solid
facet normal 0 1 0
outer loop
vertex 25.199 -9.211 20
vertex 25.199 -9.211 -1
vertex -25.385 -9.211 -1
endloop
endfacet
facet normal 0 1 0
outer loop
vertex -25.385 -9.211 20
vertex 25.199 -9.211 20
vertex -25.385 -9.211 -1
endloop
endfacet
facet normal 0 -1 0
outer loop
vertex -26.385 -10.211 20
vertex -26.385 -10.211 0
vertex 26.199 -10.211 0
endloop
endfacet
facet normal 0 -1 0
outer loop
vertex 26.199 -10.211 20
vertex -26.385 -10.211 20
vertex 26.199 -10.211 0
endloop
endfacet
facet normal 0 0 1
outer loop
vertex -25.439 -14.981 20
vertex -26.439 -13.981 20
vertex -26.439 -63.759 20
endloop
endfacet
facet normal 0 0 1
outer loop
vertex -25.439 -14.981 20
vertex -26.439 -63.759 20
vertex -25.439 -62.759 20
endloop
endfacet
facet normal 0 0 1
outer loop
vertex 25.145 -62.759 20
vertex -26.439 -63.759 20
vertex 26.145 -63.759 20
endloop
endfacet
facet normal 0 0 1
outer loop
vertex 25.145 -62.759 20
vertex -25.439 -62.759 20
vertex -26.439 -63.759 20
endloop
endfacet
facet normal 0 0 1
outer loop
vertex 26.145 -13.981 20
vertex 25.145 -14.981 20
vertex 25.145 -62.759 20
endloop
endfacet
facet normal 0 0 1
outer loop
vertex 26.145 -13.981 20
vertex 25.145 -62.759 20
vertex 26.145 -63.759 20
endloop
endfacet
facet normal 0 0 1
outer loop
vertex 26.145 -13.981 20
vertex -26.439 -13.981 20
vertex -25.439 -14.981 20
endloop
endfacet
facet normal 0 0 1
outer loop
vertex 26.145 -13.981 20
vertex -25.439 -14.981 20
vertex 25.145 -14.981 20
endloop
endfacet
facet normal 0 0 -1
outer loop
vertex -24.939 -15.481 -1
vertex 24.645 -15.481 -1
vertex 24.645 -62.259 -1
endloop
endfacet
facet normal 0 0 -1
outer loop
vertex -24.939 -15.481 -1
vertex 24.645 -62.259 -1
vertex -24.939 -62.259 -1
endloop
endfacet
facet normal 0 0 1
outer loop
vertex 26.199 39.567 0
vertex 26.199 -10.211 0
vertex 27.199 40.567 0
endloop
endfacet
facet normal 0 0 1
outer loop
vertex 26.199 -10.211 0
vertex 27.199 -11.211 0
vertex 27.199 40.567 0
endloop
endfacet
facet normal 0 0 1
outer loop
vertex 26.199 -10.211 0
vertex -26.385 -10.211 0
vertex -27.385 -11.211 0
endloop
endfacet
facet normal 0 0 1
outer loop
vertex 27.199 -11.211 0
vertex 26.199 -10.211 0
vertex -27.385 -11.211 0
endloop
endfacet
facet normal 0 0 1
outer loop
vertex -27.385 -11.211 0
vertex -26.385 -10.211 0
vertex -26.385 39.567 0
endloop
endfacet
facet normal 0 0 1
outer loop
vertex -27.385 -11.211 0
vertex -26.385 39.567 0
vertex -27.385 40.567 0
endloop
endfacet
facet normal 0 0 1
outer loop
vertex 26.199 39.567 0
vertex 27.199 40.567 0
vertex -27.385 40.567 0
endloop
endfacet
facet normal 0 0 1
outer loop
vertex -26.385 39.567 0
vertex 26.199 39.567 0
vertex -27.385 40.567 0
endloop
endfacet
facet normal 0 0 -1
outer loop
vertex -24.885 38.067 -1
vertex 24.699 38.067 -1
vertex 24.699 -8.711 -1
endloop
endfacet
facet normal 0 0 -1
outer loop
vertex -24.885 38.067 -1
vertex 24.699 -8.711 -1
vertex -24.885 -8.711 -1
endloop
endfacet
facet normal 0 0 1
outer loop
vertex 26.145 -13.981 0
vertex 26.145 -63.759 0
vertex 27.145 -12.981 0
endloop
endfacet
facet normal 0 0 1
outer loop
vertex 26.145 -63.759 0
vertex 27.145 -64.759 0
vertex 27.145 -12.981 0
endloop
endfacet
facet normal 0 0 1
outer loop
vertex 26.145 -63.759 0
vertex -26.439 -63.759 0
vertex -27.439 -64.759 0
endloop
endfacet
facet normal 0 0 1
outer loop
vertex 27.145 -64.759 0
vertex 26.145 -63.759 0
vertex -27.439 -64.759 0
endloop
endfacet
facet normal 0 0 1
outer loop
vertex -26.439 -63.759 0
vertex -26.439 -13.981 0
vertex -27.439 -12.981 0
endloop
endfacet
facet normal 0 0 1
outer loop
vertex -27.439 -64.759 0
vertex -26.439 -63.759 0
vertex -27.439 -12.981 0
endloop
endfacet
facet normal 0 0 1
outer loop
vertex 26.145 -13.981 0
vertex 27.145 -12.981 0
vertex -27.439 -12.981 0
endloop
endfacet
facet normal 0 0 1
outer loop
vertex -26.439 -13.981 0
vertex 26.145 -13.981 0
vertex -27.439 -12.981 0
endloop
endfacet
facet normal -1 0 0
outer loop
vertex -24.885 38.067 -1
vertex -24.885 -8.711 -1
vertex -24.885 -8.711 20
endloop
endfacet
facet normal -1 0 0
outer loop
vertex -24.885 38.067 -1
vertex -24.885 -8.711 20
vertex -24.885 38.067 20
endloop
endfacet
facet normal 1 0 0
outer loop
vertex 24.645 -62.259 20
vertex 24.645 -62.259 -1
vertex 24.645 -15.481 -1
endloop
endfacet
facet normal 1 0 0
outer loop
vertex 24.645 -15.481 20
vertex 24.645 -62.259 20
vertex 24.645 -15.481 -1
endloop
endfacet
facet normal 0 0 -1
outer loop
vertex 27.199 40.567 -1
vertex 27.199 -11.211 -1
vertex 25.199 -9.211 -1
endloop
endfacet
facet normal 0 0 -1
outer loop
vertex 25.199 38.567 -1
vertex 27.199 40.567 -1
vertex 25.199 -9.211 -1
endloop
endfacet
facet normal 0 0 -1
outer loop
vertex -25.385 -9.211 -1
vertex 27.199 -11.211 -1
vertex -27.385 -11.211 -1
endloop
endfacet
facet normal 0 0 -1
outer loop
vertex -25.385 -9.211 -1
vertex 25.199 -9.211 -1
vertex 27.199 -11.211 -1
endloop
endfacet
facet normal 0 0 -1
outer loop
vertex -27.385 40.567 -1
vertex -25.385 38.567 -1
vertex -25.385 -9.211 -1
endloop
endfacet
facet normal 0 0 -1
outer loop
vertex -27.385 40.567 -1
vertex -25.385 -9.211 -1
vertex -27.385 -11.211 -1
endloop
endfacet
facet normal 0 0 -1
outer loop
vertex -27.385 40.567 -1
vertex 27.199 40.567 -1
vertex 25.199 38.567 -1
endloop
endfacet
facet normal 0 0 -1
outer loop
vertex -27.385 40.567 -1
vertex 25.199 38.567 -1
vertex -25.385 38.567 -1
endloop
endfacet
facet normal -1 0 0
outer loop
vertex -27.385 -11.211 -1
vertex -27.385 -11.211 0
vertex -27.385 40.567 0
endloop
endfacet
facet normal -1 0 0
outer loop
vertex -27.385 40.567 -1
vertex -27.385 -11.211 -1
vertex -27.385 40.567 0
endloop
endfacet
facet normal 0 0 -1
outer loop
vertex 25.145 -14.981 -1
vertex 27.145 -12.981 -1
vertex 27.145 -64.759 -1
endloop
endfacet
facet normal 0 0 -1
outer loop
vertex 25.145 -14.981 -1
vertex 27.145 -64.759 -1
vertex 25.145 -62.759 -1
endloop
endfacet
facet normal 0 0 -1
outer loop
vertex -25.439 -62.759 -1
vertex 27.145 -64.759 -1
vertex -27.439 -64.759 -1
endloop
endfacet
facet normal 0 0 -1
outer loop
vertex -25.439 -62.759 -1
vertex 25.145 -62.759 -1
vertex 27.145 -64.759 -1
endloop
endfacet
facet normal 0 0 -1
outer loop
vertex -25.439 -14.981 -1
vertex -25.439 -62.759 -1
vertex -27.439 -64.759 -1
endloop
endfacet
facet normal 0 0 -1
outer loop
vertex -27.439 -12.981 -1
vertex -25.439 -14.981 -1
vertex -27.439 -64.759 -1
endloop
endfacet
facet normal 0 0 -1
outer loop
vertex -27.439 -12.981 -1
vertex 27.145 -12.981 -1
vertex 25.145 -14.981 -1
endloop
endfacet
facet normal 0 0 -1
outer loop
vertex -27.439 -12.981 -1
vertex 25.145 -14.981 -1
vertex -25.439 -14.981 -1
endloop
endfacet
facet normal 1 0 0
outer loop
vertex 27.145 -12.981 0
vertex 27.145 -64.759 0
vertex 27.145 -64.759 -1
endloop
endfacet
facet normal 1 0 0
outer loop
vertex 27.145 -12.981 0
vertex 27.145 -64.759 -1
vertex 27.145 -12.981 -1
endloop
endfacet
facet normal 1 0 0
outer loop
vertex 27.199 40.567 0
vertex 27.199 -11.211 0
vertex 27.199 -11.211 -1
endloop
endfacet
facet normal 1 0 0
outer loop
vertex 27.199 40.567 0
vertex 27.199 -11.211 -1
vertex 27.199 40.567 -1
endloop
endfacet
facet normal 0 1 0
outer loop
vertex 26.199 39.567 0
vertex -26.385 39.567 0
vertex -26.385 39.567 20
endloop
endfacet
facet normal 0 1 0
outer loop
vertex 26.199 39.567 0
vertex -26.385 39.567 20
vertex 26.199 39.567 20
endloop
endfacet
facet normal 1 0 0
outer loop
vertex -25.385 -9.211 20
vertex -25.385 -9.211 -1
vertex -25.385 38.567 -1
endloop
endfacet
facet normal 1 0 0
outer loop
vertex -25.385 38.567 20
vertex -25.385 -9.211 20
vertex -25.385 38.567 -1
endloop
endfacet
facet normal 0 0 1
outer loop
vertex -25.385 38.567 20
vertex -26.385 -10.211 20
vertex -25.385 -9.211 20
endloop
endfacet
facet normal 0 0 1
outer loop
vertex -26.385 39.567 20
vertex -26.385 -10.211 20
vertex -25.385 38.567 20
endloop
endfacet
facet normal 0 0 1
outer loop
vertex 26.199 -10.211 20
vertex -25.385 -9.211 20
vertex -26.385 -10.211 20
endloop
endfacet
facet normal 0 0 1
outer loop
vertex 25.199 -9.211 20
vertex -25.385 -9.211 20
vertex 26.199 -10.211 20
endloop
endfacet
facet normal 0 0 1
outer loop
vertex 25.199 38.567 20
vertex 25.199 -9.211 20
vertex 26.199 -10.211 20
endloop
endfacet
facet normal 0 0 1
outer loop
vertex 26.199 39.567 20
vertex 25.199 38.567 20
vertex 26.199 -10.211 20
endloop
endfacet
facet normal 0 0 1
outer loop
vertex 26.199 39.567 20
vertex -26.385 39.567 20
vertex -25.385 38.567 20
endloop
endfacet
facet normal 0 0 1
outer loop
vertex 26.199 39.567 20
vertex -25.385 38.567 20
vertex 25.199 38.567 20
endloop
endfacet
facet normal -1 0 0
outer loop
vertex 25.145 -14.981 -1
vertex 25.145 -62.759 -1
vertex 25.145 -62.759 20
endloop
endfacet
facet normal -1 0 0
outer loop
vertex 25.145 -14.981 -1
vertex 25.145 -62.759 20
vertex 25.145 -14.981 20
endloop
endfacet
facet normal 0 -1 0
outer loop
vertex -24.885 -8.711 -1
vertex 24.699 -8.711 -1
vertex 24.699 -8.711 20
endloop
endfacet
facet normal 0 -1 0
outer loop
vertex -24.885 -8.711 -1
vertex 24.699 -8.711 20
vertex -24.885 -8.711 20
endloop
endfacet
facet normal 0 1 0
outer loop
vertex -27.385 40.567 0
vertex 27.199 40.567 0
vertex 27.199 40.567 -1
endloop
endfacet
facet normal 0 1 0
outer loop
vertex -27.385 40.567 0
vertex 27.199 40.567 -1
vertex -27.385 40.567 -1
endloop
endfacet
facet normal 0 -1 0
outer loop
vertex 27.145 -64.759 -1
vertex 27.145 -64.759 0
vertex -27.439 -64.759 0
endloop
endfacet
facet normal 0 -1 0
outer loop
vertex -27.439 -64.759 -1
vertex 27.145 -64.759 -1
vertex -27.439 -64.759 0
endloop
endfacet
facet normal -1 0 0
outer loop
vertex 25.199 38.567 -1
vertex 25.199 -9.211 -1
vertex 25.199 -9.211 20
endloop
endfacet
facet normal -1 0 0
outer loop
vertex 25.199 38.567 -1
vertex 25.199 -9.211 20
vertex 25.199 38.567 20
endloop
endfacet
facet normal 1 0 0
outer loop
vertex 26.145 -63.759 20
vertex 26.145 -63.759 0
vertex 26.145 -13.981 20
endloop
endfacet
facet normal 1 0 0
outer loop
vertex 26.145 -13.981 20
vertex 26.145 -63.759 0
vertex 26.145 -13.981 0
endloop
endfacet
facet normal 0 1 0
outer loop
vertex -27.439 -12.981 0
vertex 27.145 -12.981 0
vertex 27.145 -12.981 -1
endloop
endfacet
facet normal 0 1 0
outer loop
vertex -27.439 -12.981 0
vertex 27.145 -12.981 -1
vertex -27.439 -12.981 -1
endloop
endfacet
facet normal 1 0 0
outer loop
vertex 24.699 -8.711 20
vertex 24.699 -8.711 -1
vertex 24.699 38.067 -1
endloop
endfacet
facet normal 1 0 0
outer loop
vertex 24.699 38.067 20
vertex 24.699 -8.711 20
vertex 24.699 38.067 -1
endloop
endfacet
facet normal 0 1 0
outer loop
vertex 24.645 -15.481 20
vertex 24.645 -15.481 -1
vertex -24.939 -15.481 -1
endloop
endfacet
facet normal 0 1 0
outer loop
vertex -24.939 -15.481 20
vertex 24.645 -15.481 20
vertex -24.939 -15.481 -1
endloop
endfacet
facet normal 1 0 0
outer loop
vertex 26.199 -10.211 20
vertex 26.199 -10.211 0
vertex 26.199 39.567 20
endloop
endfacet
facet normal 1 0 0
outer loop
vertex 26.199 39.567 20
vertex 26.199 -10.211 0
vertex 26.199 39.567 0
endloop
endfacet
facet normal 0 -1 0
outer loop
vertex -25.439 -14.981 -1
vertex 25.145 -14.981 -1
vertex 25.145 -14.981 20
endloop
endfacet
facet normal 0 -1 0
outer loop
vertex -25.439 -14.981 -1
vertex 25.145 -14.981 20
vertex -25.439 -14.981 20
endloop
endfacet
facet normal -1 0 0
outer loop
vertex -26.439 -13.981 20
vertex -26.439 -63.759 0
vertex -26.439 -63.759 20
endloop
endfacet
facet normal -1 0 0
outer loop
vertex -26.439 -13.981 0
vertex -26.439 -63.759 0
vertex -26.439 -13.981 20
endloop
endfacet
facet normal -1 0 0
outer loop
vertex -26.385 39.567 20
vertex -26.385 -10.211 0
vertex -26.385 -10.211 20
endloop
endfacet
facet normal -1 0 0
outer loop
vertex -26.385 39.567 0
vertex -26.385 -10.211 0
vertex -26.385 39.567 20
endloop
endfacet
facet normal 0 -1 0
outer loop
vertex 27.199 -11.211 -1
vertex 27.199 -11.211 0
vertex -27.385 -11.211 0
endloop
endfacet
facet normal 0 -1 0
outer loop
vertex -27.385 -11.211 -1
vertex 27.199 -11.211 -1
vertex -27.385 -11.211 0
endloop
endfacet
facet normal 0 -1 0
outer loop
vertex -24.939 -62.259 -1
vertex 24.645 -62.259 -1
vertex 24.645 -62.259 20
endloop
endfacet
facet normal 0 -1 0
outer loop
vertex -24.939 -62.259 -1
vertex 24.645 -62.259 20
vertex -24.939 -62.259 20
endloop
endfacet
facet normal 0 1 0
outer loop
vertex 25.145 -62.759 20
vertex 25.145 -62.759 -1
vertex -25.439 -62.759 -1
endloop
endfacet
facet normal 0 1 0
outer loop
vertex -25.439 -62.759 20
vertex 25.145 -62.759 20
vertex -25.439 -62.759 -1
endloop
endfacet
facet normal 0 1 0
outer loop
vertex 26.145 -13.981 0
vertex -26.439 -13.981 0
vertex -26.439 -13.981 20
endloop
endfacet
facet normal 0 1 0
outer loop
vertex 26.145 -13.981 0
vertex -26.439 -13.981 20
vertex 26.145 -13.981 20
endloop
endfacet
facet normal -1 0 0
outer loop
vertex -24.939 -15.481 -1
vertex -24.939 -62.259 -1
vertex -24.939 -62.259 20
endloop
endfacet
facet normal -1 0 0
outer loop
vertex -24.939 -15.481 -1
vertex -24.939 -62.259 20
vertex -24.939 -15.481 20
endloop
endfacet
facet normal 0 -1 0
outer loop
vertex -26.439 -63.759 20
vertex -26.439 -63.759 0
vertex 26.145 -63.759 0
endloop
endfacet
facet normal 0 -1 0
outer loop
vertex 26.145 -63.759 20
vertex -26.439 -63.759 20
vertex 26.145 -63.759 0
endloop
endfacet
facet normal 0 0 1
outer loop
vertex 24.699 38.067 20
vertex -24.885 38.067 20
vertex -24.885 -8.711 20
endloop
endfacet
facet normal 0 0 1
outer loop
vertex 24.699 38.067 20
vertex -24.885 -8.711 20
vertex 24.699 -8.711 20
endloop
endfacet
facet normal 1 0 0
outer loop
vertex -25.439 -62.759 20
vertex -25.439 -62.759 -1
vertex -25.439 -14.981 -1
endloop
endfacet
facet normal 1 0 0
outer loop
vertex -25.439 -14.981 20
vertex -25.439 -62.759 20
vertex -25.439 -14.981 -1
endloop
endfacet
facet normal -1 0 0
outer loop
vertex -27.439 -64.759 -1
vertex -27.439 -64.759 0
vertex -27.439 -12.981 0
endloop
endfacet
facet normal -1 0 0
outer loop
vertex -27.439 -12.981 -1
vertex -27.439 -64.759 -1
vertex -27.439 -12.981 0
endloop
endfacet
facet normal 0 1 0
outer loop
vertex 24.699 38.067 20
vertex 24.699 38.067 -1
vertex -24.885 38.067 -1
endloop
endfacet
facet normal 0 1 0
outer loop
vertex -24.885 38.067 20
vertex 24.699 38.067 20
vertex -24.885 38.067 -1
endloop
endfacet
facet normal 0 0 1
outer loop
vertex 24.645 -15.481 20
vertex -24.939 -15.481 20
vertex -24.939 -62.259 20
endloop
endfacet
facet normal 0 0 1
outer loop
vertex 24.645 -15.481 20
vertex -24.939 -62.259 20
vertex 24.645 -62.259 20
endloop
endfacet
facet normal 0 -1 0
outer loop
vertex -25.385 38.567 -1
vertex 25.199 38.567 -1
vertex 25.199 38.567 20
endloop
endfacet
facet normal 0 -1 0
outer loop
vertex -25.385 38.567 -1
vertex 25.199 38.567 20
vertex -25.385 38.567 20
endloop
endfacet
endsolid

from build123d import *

# Parameters (mm, degrees)
SKETCH1_W             = 52.58415813
SKETCH1_H             = 49.778317302
BOSS_EXTRUDE1_DEPTH   = 20
SKETCH1_W_2           = 52.584158129
BOSS_EXTRUDE1_2_DEPTH = 20
SKETCH4_W             = 54.584158129
SKETCH4_H             = 51.778317302
BOSS_EXTRUDE2_DEPTH   = 1
SKETCH5_W             = 50.584158129
SKETCH5_H             = 47.778317302
SKETCH5_W_2           = 49.584158129
SKETCH5_H_2           = 46.778317302
CUT_EXTRUDE3_DEPTH    = 73.499422953
SKETCH6_W             = 54.58415813
SKETCH6_H             = 51.778317302
BOSS_EXTRUDE3_DEPTH   = 1
SKETCH7_W             = 50.58415813
SKETCH7_H             = 47.778317302
SKETCH7_W_2           = 49.58415813
SKETCH7_H_2           = 46.778317302
CUT_EXTRUDE4_DEPTH    = 74.400330453


with BuildPart() as part:
    # Sketch1 → Boss-Extrude1 (new body)
    with BuildSketch(Plane.XY):
        with Locations((-0.146707389, -38.869790603)):
            Rectangle(SKETCH1_W, SKETCH1_H)
    extrude(amount=BOSS_EXTRUDE1_DEPTH)

    # Sketch6 → Boss-Extrude3 (add, through all)
    with BuildSketch(Plane(origin=(0, 0, 0), x_dir=(-1, 0, 0), z_dir=(0, 0, -1))):
        with Locations((0.146707389, -38.869790603)):
            Rectangle(SKETCH6_W, SKETCH6_H)
    extrude(amount=BOSS_EXTRUDE3_DEPTH)

    # Sketch7 → Cut-Extrude4 (cut, through all)
    with BuildSketch(Plane(origin=(0, 0, -1), x_dir=(-1, 0, 0), z_dir=(0, 0, -1))):
        with Locations((0.146707389, -38.869790603)):
            Rectangle(SKETCH7_W, SKETCH7_H)
        with Locations((0.146707389, -38.869790603)):
            Rectangle(SKETCH7_W_2, SKETCH7_H_2, mode=Mode.SUBTRACT)
    extrude(amount=-CUT_EXTRUDE4_DEPTH, mode=Mode.SUBTRACT)


with BuildPart() as body_2:
    # Sketch1 → Boss-Extrude1 2 (new body)
    with BuildSketch(Plane.XY):
        with Locations((-0.093368138, 14.678326015)):
            Rectangle(SKETCH1_W_2, SKETCH1_H)
    extrude(amount=BOSS_EXTRUDE1_2_DEPTH)

    # Sketch4 → Boss-Extrude2 (add)
    with BuildSketch(Plane(origin=(0, 0, 0), x_dir=(-1, 0, 0), z_dir=(0, 0, -1))):
        with Locations((0.093368138, 14.678326015)):
            Rectangle(SKETCH4_W, SKETCH4_H)
    extrude(amount=BOSS_EXTRUDE2_DEPTH)

    # Sketch5 → Cut-Extrude3 (cut, through all)
    with BuildSketch(Plane(origin=(0, 0, -1), x_dir=(-1, 0, 0), z_dir=(0, 0, -1))):
        with Locations((0.093368138, 14.678326015)):
            Rectangle(SKETCH5_W, SKETCH5_H)
        with Locations((0.093368138, 14.678326015)):
            Rectangle(SKETCH5_W_2, SKETCH5_H_2, mode=Mode.SUBTRACT)
    extrude(amount=-CUT_EXTRUDE3_DEPTH, mode=Mode.SUBTRACT)


with BuildPart() as cut_extrude3_piece_1:
    # of the separate pieces the step leaves, piece 1, a body of its own (cut_extrude3_pieces)
    add(body_2.part.solids().sort_by_distance((-24.885447202, -8.710832636, -1))[0])


with BuildPart() as cut_extrude3_piece_2:
    # of the separate pieces the step leaves, piece 2, a body of its own (cut_extrude3_pieces)
    add(body_2.part.solids().sort_by_distance((-27.385447202, -11.210832636, 0))[0])


with BuildPart() as cut_extrude4_piece_1:
    # of the separate pieces the step leaves, piece 1, a body of its own (cut_extrude4_pieces)
    add(part.part.solids().sort_by_distance((24.645371676, -15.480631952, -1))[0])


with BuildPart() as cut_extrude4_piece_2:
    # of the separate pieces the step leaves, piece 2, a body of its own (cut_extrude4_pieces)
    add(part.part.solids().sort_by_distance((27.145371676, -64.758949254, 0))[0])


solid = Compound([cut_extrude3_piece_1.part, cut_extrude3_piece_2.part, cut_extrude4_piece_1.part, cut_extrude4_piece_2.part])
